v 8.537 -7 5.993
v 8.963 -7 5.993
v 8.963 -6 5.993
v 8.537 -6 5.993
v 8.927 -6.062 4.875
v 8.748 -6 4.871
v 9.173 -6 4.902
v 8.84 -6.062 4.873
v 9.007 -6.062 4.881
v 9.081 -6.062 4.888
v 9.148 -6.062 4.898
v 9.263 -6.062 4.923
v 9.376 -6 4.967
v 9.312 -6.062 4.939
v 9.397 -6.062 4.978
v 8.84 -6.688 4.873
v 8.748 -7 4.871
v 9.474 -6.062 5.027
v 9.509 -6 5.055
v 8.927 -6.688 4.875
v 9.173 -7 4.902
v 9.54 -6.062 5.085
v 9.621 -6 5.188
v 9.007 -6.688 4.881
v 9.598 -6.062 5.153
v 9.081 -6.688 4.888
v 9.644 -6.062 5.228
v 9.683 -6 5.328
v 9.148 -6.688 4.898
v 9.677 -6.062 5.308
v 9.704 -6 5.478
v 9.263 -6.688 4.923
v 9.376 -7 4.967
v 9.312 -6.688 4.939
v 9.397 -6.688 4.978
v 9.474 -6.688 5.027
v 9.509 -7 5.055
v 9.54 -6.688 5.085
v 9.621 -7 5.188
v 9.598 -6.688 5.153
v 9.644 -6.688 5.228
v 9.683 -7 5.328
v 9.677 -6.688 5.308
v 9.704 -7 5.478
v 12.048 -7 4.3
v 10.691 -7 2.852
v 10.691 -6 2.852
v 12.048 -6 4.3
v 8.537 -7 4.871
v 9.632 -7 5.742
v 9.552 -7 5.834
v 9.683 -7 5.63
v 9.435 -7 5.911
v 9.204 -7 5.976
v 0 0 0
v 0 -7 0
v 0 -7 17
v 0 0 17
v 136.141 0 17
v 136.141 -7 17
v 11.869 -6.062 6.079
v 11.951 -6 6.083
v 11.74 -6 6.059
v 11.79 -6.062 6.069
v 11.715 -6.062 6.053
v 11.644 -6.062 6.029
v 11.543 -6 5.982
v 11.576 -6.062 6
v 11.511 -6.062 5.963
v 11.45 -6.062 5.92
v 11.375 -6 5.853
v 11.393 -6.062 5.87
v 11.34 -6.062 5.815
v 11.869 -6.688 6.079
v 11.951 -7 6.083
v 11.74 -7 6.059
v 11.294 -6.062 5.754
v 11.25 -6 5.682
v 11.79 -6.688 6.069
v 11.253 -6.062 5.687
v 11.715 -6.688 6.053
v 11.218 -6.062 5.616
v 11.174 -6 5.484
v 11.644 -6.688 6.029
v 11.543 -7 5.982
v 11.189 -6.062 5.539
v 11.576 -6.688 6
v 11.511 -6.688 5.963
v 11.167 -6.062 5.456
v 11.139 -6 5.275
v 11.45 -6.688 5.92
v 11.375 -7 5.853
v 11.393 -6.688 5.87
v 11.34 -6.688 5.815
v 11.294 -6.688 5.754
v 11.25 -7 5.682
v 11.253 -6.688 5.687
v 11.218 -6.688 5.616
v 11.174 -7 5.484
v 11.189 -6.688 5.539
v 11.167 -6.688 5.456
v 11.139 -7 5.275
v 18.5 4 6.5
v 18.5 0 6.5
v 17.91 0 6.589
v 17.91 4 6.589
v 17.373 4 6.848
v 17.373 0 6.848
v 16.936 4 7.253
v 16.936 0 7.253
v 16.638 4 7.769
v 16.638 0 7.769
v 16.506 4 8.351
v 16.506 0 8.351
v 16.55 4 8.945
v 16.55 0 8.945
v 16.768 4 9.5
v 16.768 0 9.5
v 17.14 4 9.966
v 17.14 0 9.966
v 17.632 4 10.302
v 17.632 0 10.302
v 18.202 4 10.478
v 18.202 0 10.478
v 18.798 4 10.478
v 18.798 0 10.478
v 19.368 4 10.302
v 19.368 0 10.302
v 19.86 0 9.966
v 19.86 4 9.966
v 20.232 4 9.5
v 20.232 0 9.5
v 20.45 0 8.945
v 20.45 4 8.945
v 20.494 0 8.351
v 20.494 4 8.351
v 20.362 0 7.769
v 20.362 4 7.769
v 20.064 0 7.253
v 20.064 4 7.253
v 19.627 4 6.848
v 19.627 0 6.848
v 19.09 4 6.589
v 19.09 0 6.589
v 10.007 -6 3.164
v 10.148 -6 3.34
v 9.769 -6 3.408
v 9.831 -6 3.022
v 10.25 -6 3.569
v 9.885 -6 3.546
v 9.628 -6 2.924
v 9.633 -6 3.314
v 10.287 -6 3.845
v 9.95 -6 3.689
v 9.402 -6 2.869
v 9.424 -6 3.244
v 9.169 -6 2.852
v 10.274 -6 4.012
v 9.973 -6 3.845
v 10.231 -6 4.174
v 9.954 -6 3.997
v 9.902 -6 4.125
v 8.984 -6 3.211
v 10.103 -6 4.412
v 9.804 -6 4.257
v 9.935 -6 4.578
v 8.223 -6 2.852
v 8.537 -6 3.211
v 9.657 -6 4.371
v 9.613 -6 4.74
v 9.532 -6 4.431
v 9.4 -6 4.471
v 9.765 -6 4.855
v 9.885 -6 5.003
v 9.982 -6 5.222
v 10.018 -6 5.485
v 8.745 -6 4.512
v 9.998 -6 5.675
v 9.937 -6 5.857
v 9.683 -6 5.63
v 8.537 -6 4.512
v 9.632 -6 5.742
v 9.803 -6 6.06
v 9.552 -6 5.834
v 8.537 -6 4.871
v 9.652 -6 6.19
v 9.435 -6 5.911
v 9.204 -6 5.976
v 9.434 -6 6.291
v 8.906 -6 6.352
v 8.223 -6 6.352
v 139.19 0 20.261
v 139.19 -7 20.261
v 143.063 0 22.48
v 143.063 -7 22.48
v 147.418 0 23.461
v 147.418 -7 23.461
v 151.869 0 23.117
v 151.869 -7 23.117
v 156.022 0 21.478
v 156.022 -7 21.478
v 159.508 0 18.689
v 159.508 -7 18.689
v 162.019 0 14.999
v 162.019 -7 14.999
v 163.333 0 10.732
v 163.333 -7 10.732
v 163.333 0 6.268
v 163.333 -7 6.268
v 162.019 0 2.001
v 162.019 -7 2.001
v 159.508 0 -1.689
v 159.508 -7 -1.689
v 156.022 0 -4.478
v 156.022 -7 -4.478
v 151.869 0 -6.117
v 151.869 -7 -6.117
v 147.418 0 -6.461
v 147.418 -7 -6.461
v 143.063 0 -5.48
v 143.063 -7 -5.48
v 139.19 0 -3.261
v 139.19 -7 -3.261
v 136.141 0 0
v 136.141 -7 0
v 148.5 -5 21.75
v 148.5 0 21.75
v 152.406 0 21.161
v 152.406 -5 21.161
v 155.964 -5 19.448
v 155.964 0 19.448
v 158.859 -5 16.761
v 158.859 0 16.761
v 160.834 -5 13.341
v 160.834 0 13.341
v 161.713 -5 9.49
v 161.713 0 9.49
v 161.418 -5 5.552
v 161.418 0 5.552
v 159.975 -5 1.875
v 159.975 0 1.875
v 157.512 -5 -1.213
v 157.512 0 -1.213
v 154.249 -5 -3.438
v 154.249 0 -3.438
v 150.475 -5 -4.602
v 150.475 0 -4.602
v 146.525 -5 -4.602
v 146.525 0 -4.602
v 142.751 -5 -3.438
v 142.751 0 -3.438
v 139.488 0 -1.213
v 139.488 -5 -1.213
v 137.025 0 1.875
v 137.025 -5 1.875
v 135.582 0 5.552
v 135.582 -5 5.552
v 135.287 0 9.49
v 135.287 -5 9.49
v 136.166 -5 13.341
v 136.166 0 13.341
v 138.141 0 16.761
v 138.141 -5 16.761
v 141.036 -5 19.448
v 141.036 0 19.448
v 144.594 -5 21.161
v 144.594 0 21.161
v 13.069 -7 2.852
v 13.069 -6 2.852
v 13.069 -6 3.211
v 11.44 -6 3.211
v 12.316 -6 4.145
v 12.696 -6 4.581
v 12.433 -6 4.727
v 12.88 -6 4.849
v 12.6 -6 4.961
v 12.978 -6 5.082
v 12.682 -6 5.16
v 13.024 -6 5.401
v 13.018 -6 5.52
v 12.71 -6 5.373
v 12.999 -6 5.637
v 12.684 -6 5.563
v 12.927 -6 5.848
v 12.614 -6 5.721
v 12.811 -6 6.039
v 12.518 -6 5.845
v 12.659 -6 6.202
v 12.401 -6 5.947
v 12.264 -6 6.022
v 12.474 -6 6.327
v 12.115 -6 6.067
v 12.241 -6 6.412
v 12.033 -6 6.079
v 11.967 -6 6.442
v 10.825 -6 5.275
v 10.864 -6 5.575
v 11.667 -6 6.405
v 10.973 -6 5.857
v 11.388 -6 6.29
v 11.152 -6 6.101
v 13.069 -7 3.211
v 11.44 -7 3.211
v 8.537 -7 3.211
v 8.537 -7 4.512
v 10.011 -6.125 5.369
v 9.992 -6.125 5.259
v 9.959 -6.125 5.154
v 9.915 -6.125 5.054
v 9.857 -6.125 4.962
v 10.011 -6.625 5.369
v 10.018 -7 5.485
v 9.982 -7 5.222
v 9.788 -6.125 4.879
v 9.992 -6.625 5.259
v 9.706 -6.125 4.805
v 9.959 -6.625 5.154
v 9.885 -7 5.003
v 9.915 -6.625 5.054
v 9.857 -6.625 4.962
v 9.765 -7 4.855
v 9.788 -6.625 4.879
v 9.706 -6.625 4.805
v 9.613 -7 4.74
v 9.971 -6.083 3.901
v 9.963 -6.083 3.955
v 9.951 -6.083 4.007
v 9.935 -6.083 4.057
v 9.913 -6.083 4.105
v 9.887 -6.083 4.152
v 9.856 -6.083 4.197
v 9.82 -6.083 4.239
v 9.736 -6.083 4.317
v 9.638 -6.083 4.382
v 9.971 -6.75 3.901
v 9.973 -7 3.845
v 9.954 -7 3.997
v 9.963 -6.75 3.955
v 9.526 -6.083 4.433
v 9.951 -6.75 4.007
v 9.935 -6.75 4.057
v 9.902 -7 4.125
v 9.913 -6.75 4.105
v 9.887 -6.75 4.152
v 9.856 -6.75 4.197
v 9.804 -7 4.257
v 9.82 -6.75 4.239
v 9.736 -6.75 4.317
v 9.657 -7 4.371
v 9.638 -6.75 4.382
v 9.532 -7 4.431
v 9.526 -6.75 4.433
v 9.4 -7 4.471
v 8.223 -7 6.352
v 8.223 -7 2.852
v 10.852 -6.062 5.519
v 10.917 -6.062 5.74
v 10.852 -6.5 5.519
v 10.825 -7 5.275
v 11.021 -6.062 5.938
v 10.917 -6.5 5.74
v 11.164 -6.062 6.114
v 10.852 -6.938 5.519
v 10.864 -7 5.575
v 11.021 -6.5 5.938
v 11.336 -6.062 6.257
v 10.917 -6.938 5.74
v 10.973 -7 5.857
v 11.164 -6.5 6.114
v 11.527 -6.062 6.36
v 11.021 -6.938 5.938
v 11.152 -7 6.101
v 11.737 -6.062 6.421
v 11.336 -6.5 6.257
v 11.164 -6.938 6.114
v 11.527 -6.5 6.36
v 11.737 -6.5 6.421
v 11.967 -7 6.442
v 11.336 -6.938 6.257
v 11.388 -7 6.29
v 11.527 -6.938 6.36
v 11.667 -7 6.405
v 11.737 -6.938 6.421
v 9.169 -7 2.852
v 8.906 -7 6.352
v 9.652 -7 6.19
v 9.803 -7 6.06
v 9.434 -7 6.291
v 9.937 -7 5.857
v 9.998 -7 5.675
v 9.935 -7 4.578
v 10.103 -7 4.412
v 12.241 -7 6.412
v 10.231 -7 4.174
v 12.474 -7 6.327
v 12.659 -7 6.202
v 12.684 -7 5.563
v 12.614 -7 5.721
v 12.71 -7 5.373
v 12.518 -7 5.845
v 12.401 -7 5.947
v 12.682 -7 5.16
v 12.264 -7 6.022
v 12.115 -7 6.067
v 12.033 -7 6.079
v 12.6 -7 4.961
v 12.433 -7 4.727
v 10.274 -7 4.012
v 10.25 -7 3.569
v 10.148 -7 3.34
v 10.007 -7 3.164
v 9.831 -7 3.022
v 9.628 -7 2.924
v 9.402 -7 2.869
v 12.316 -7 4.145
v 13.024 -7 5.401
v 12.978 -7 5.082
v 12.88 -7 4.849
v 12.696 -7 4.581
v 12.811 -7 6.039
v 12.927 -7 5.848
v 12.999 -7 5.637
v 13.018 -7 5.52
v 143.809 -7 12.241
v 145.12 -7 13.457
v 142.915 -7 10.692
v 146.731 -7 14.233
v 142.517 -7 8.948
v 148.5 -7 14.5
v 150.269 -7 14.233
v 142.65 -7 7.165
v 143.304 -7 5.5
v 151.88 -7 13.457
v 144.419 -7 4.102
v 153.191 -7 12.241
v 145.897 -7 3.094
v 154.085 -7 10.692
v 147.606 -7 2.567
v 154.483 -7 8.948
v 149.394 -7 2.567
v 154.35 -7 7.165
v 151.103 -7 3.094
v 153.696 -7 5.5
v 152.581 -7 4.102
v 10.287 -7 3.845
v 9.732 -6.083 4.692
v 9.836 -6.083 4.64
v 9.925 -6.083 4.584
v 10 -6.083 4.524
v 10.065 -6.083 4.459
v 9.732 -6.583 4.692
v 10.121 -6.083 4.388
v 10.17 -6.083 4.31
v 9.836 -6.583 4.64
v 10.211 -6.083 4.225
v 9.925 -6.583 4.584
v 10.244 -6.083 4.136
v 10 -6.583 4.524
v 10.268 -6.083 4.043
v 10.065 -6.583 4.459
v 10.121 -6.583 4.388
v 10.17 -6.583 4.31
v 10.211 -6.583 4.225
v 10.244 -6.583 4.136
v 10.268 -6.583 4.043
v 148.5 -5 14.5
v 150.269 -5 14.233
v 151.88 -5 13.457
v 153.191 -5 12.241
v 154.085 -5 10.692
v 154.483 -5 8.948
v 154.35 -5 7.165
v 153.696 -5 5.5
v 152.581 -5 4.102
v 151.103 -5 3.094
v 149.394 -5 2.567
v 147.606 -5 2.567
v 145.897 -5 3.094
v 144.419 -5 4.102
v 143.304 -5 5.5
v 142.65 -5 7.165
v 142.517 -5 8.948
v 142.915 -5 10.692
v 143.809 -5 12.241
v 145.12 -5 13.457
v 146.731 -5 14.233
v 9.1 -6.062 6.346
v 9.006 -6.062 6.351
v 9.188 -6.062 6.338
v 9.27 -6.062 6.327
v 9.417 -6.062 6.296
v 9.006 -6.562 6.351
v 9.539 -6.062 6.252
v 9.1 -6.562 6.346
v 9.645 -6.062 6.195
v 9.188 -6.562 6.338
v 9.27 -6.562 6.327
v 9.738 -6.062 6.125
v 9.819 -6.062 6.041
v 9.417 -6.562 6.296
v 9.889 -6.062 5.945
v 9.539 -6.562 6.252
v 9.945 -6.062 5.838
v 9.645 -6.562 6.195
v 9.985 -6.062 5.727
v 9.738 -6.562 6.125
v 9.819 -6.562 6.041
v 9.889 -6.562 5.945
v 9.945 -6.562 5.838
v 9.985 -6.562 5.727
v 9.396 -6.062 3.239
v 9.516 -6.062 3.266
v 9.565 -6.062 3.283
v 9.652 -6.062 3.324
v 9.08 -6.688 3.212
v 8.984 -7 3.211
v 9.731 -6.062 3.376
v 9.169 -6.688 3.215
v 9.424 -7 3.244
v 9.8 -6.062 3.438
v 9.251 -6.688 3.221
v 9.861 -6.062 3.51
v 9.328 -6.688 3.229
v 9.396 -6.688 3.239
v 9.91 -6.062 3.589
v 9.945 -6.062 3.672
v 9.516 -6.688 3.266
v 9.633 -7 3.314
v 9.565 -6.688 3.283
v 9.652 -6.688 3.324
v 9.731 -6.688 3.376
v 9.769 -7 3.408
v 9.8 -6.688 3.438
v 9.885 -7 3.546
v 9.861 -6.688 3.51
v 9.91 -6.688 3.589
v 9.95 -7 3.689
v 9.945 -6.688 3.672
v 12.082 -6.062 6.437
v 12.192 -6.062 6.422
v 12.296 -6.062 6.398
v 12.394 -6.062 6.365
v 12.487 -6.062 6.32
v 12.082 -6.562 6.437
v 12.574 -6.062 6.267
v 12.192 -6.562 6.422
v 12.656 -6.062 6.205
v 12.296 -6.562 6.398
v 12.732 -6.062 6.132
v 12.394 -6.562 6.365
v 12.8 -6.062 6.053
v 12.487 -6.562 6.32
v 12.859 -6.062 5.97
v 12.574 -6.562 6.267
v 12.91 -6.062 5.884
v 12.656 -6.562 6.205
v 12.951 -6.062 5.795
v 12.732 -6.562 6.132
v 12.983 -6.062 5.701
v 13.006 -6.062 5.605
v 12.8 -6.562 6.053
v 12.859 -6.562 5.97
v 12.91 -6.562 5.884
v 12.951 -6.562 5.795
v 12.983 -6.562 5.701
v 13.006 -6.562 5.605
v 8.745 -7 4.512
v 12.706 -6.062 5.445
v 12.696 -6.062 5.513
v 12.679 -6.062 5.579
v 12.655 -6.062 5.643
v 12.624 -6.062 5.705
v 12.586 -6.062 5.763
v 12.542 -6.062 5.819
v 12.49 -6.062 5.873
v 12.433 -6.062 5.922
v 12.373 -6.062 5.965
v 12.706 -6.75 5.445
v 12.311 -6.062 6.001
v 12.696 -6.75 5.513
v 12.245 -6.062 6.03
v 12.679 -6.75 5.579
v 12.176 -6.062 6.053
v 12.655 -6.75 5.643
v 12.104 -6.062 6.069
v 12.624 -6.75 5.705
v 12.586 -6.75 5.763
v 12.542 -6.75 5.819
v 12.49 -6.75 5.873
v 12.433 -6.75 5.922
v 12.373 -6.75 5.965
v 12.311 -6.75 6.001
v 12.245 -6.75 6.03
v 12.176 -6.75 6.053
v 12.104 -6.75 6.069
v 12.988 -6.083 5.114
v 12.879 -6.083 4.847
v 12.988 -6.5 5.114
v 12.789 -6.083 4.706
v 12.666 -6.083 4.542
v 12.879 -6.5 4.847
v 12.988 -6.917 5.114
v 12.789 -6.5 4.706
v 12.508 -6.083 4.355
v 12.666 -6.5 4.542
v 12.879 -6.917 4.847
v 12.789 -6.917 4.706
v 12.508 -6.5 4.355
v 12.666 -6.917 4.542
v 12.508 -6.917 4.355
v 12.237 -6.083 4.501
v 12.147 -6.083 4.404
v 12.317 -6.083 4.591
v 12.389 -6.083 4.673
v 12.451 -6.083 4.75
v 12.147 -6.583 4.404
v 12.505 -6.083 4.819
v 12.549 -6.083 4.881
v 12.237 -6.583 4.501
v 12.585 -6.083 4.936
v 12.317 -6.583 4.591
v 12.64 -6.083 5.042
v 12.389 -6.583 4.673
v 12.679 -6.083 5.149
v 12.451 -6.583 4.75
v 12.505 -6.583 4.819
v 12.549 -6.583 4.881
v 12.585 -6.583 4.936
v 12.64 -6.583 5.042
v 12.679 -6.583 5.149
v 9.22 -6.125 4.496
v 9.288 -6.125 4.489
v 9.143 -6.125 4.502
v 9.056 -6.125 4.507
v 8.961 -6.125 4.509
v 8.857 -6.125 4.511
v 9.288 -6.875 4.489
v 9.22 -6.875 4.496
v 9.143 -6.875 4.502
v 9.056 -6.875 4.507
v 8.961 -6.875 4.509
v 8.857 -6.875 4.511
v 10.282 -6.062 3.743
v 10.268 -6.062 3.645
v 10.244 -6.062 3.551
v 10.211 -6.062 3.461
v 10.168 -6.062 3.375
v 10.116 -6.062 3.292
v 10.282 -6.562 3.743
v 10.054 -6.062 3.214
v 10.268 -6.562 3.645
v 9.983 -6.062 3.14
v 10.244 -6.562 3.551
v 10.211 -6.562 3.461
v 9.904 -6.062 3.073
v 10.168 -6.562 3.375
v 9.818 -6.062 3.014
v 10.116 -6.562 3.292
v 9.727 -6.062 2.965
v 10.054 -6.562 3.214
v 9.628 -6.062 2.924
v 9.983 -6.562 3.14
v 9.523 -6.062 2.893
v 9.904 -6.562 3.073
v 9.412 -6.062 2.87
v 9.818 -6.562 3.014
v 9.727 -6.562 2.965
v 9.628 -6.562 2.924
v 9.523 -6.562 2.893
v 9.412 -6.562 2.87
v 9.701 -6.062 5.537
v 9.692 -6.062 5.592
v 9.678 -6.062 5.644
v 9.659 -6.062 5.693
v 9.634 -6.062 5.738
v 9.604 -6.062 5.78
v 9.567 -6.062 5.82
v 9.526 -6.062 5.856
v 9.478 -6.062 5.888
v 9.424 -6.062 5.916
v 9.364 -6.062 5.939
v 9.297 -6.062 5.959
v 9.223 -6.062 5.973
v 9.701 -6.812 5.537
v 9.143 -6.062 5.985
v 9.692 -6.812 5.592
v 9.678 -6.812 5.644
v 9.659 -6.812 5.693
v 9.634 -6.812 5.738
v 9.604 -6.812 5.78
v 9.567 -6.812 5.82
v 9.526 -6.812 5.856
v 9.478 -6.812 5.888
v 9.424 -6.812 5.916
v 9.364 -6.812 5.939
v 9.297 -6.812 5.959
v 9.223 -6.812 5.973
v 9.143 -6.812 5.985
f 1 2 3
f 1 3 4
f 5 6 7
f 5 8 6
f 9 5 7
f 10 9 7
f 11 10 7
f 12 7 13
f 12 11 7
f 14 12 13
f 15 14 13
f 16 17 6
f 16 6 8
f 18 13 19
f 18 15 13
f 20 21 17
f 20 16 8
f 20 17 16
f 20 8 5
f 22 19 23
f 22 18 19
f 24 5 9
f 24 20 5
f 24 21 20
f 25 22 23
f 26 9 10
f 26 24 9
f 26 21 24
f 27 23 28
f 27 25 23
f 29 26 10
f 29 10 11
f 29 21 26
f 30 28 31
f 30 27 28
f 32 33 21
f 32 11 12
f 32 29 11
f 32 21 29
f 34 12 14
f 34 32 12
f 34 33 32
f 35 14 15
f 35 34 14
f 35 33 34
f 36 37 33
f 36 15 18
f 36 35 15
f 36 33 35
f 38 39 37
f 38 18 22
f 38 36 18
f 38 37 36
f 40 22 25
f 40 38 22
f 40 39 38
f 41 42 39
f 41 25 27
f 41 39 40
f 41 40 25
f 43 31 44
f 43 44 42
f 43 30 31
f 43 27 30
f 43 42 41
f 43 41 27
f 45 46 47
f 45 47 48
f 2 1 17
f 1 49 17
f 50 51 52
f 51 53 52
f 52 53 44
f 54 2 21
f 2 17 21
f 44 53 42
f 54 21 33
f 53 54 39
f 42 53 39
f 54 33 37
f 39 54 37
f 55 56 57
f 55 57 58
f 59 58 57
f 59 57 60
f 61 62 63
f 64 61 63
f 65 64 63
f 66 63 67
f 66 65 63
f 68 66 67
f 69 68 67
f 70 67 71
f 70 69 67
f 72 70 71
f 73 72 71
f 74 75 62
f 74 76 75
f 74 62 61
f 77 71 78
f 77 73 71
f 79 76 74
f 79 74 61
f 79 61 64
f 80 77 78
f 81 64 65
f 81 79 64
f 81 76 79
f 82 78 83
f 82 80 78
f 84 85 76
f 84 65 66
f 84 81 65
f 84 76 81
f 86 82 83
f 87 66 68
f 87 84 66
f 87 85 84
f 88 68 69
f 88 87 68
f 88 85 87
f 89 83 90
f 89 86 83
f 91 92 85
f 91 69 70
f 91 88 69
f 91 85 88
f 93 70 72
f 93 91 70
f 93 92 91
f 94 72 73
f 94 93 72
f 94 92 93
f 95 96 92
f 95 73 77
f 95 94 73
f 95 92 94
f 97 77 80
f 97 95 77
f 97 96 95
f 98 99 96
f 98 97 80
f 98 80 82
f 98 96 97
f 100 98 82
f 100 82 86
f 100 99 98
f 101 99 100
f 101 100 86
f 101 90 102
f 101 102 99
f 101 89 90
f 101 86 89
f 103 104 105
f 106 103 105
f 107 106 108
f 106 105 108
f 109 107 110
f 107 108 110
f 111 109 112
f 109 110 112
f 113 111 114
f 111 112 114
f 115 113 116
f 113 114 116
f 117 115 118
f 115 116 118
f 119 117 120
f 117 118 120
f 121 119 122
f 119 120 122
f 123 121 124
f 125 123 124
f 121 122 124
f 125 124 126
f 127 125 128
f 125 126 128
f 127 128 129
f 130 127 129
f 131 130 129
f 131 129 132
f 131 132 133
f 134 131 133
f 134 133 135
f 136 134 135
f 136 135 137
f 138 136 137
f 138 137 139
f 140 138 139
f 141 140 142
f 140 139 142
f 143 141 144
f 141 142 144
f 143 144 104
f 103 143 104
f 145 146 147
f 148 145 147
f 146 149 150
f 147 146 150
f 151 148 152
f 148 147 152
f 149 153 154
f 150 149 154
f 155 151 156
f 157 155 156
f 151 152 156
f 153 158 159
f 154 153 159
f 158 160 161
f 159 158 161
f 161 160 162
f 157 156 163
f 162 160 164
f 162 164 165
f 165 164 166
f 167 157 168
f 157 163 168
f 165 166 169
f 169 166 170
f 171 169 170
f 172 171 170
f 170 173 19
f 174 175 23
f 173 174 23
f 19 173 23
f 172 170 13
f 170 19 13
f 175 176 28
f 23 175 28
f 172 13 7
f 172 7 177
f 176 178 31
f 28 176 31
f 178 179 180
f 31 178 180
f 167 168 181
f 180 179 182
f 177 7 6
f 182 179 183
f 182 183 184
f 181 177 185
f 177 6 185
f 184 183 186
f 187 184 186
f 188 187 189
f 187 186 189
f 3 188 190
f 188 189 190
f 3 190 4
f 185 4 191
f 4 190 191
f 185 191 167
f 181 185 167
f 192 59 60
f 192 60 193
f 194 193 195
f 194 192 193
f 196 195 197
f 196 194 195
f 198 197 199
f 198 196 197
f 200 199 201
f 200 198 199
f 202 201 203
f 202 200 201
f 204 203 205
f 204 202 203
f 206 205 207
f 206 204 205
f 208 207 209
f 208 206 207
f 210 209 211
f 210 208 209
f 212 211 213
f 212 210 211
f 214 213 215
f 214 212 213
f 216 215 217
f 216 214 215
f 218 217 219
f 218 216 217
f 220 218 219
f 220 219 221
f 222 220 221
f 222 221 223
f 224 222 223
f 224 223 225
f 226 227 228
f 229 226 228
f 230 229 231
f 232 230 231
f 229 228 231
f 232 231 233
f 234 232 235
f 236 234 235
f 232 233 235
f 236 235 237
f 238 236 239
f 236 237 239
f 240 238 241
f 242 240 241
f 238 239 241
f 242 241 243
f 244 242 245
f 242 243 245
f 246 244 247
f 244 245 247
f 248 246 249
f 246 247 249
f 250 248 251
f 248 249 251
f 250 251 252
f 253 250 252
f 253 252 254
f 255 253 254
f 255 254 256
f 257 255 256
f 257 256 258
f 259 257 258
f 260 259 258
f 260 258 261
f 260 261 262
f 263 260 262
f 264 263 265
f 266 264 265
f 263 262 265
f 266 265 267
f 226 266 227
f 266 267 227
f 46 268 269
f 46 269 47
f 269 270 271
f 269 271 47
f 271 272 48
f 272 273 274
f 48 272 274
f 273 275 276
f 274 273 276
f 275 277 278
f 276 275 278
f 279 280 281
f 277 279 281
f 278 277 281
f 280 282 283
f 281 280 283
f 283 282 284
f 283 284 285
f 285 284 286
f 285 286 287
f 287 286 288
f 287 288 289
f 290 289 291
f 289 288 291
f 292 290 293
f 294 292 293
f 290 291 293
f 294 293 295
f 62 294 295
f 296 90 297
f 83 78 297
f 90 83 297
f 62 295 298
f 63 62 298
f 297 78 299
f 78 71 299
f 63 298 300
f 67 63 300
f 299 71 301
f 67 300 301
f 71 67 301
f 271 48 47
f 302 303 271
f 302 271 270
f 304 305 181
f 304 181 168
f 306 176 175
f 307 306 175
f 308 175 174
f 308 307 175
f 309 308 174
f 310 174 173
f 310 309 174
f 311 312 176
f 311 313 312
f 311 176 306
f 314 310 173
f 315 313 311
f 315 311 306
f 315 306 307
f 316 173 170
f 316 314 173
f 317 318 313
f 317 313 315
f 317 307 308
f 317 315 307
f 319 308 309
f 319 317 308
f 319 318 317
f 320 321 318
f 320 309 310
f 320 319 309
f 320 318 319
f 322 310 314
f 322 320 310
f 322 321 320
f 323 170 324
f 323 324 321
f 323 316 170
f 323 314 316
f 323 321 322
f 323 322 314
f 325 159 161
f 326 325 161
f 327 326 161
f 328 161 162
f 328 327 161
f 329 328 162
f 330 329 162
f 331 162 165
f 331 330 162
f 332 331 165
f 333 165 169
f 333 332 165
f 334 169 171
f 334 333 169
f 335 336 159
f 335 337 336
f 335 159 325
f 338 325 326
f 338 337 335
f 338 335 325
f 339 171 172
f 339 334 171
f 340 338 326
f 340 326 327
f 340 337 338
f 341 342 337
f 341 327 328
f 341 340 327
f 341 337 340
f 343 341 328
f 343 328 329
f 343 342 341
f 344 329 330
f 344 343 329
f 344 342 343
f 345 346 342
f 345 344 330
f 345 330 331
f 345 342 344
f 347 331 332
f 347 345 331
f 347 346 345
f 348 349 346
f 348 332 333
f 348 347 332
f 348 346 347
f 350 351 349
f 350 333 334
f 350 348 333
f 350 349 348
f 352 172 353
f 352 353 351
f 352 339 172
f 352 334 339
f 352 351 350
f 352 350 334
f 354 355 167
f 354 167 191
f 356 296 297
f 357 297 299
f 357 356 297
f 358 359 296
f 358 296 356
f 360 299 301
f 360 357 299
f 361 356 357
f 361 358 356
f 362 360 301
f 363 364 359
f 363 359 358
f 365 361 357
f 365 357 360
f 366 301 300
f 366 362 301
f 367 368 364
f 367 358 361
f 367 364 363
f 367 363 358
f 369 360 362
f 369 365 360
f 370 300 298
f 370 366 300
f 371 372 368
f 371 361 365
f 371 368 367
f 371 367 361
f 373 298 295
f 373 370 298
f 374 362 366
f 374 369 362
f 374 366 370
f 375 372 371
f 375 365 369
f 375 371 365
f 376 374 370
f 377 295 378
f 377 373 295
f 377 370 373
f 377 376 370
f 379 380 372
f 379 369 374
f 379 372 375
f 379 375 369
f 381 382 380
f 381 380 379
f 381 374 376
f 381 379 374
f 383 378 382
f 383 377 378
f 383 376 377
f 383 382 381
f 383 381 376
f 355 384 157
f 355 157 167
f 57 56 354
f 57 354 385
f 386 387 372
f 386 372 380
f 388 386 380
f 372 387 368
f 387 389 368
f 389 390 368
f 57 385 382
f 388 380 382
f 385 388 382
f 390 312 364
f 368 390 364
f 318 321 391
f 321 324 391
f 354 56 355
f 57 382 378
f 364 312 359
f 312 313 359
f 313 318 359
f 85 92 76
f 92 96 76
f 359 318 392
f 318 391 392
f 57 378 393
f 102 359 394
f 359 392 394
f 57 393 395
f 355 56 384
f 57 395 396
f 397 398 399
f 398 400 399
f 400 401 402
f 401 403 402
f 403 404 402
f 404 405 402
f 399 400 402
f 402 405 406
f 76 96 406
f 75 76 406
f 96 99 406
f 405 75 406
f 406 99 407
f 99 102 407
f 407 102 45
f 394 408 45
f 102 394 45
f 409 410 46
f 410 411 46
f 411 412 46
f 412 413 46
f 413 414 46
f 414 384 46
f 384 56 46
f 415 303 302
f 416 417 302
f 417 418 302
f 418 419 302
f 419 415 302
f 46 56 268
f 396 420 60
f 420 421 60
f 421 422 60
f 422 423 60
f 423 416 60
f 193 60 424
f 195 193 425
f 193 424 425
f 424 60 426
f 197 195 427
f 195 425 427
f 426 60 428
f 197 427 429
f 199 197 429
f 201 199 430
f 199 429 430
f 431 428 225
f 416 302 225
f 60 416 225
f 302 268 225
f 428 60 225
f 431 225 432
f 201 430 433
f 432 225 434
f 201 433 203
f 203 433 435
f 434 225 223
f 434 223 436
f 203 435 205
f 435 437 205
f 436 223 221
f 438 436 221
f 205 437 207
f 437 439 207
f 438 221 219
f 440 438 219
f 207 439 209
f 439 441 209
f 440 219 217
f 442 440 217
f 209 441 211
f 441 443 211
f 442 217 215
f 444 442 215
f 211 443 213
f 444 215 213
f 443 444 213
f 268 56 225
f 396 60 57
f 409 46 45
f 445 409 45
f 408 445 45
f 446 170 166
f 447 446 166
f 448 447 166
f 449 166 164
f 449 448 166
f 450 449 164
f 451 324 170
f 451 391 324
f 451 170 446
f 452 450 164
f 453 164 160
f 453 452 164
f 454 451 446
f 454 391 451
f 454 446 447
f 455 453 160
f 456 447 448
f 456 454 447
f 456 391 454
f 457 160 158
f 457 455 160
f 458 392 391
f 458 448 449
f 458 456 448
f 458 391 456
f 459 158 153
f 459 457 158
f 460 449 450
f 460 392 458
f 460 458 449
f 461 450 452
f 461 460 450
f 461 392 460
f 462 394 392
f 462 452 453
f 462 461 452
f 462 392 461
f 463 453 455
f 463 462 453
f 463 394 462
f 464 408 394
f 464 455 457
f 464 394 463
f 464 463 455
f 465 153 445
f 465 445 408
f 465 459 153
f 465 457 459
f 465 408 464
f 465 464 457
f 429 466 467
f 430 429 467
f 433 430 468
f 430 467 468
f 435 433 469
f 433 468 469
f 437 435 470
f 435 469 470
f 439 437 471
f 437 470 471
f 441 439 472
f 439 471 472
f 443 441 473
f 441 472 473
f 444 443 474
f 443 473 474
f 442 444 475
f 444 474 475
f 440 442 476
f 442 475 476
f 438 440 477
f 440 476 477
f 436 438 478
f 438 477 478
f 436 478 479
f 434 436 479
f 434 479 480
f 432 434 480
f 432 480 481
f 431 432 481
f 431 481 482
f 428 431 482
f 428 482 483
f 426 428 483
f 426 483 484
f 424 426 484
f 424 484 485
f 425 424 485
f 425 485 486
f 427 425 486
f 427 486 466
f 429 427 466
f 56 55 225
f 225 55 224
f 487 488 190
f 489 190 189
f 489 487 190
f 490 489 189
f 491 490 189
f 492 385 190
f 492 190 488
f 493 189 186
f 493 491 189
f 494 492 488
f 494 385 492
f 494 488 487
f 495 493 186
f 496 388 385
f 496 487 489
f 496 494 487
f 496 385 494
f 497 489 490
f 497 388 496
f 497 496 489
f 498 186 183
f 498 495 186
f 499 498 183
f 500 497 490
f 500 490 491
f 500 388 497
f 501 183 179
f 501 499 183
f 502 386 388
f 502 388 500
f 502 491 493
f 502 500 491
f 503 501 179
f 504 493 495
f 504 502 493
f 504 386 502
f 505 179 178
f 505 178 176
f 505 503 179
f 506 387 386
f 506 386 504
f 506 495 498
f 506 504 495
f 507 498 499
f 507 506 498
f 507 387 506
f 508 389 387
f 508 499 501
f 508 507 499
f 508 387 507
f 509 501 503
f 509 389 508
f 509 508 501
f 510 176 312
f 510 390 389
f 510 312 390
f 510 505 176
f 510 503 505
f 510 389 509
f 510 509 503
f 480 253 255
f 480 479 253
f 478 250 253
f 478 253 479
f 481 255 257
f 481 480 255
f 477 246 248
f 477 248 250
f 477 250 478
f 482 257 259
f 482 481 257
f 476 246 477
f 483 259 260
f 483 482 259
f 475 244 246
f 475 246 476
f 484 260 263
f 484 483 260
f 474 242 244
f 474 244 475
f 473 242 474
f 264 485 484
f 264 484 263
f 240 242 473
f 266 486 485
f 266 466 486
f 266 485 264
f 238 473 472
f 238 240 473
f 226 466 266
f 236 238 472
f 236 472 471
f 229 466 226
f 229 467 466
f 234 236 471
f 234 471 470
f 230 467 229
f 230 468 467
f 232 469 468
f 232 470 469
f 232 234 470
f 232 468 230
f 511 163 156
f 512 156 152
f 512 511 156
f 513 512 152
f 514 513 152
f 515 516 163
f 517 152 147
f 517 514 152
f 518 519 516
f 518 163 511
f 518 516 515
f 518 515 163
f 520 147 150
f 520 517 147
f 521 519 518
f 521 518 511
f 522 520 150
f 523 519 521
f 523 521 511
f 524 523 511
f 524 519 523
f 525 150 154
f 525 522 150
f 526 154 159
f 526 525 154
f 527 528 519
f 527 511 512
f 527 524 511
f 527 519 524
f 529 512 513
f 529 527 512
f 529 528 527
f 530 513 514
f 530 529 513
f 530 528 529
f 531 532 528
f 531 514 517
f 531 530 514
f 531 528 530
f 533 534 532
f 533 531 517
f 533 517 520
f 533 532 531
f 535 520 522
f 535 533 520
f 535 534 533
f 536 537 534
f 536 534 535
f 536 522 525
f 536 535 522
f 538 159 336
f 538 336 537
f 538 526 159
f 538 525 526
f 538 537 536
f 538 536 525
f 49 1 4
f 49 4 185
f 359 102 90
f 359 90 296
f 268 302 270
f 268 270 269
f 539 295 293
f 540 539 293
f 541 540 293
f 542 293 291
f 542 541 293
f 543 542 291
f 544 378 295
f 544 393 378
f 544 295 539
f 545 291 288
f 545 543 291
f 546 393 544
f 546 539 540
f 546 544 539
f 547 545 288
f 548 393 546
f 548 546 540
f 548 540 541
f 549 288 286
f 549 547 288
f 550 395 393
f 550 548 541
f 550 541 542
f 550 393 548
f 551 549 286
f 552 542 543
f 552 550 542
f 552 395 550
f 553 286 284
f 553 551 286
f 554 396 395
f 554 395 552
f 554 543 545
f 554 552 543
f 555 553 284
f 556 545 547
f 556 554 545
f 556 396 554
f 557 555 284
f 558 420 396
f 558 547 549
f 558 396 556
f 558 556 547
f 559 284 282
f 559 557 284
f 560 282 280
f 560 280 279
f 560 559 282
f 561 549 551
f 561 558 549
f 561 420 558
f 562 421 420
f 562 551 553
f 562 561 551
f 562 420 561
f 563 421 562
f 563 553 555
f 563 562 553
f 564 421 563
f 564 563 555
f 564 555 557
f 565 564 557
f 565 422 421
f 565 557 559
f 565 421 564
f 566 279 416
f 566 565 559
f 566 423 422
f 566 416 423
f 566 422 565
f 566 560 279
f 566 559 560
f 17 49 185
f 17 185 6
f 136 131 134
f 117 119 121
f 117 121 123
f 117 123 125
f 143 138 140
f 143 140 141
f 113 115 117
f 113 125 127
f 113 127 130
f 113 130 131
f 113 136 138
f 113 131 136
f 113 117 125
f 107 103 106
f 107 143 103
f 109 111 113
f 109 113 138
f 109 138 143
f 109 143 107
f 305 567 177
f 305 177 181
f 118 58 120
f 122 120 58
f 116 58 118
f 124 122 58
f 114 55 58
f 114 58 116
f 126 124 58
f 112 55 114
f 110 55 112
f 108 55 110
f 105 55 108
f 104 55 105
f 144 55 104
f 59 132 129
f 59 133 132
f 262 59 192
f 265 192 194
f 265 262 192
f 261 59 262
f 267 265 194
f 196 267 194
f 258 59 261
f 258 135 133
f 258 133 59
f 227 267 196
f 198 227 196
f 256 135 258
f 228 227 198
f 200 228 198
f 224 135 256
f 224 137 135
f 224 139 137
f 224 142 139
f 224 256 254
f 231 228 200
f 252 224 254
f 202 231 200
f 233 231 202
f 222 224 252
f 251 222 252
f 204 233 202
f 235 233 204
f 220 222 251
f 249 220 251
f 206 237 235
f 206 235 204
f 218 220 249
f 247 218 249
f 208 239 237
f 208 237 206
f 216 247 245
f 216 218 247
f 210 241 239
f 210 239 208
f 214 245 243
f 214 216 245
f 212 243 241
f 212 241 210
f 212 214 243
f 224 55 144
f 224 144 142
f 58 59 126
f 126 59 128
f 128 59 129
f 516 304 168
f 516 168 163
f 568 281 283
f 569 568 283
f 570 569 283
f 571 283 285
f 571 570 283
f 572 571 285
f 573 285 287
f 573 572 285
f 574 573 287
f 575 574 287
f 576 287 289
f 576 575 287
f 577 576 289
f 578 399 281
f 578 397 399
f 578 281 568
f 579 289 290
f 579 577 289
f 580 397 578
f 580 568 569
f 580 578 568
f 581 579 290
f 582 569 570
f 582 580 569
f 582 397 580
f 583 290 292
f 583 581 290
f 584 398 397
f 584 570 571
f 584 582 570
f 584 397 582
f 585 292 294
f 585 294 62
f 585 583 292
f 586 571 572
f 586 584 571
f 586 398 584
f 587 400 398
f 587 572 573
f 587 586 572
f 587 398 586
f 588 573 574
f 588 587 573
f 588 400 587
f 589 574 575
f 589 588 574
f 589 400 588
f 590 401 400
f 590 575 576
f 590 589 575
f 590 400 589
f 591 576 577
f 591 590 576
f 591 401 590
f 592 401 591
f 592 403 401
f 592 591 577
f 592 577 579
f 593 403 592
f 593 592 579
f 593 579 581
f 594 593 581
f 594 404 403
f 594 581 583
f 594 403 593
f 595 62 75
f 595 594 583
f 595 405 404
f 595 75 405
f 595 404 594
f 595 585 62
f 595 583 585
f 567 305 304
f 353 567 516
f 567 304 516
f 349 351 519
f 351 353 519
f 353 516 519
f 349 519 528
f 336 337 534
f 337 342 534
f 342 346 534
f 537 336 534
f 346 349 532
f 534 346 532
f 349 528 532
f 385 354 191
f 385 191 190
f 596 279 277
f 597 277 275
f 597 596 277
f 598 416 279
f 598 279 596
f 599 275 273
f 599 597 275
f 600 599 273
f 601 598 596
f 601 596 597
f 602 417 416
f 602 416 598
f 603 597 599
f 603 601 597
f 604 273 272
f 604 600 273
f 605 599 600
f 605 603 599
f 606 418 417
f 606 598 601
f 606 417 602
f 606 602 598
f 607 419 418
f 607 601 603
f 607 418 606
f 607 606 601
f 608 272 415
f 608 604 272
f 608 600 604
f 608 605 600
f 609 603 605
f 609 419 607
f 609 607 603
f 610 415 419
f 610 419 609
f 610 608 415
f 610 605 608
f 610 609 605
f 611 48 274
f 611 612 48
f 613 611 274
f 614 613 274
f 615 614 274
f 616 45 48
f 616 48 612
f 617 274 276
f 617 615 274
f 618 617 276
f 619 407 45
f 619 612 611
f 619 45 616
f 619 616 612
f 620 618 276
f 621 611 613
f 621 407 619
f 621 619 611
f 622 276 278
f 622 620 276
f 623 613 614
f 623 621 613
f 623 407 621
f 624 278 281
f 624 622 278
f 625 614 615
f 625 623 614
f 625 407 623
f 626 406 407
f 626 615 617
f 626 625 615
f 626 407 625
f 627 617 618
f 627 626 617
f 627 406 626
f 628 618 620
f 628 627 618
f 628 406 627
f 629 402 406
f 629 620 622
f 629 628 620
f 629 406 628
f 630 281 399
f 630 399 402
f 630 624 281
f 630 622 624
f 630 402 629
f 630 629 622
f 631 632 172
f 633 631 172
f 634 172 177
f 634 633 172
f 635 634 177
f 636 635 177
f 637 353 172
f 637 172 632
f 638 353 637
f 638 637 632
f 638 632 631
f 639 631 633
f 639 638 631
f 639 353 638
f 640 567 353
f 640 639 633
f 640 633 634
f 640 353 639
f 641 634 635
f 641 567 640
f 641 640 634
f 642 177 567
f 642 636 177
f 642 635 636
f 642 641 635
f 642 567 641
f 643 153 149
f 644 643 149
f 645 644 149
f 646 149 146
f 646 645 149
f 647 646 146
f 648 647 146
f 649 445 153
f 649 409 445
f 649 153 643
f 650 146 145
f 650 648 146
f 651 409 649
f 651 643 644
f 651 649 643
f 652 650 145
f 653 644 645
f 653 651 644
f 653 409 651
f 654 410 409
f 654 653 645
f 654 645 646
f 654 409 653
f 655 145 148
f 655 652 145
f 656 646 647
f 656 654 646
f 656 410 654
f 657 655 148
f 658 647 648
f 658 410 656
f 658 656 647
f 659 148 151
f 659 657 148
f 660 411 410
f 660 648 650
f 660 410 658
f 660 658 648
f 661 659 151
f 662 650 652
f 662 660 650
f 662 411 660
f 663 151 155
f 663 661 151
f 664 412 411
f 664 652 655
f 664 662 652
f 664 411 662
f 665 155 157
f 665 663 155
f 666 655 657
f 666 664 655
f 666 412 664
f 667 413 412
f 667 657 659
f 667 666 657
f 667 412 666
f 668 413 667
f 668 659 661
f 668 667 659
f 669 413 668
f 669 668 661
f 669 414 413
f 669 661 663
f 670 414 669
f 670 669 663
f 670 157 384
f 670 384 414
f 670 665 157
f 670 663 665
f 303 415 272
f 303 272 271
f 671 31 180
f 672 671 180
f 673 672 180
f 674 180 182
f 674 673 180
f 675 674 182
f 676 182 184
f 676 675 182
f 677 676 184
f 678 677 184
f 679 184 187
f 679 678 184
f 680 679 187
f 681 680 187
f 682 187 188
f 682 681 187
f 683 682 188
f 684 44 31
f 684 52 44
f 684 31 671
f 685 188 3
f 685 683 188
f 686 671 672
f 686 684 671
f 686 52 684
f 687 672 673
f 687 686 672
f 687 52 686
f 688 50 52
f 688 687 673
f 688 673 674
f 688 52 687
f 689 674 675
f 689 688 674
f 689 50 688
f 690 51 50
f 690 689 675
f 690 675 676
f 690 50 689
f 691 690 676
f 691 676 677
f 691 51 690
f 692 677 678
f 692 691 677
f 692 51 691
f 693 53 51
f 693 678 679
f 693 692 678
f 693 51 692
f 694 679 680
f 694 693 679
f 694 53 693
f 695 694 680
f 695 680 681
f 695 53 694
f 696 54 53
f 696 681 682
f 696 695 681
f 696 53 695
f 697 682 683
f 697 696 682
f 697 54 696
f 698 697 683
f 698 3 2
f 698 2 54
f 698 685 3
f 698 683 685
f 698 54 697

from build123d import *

# Parameters (mm, degrees)
SKETCH_3_W          = 148.5
SKETCH_3_H          = 7
EXTRUDE_1_DEPTH     = 17
SKETCH_4_R          = 15
CUT_EXTRUDE_3_DEPTH = 150.633719462
SKETCH_6_R          = 15
EXTRUDE_2_DEPTH     = 7
SKETCH_7_R          = 13.25
CUT_EXTRUDE_4_DEPTH = 5
SKETCH_8_R          = 6
CUT_EXTRUDE_5_DEPTH = 166.255862226
SKETCH_9_R          = 2
EXTRUDE_3_DEPTH     = 4
CUT_EXTRUDE_7_DEPTH = 1


with BuildPart() as part:
    # ｽｹｯﾁ3 → ﾎﾞｽ - 押し出し1 (new body)
    with BuildSketch(Plane.XY):
        with Locations((74.25, -3.5)):
            Rectangle(SKETCH_3_W, SKETCH_3_H)
    extrude(amount=EXTRUDE_1_DEPTH)

    # ｽｹｯﾁ4 → ｶｯﾄ - 押し出し3 (cut, through all)
    with BuildSketch(Plane(origin=(0, 0, 0), x_dir=(1, 0, 0), z_dir=(0, 1, 0))):
        with Locations((148.5, -8.5)):
            Circle(SKETCH_4_R)
    extrude(amount=-CUT_EXTRUDE_3_DEPTH, mode=Mode.SUBTRACT)

    # ｽｹｯﾁ6 → ﾎﾞｽ - 押し出し2 (add)
    with BuildSketch(Plane(origin=(0, 0, 0), x_dir=(1, 0, 0), z_dir=(0, 1, 0))):
        with Locations((148.5, -8.5)):
            Circle(SKETCH_6_R)
    extrude(amount=-EXTRUDE_2_DEPTH)

    # ｽｹｯﾁ7 → ｶｯﾄ - 押し出し4 (cut)
    with BuildSketch(Plane(origin=(0, 0, 0), x_dir=(1, 0, 0), z_dir=(0, 1, 0))):
        with Locations(Location((148.5, -8.5, 0), (0, 0, 270))):
            Circle(SKETCH_7_R)
    extrude(amount=-CUT_EXTRUDE_4_DEPTH, mode=Mode.SUBTRACT)

    # ｽｹｯﾁ8 → ｶｯﾄ - 押し出し5 (cut, through all)
    with BuildSketch(Plane(origin=(0, -5, 0), x_dir=(1, 0, 0), z_dir=(0, 1, 0))):
        with Locations(Location((148.5, -8.5, 0), (0, 0, 270))):
            Circle(SKETCH_8_R)
    extrude(amount=-CUT_EXTRUDE_5_DEPTH, mode=Mode.SUBTRACT)

    # ｽｹｯﾁ9 → ﾎﾞｽ - 押し出し3 (add)
    with BuildSketch(Plane(origin=(0, 0, 0), x_dir=(1, 0, 0), z_dir=(0, 1, 0))):
        with Locations(Location((18.5, -8.5, 0), (0, 0, 90))):
            Circle(SKETCH_9_R)
    extrude(amount=EXTRUDE_3_DEPTH)

    # ｽｹｯﾁ12 → ｶｯﾄ - 押し出し7 (cut)
    # profile 1 of 2: a face of its own
    with BuildSketch(Plane.XZ.offset(7)):
        with BuildLine():
            Line((8.222746092, 6.351907356), (8.90563872, 6.351907356))
            add(Edge.make_bspline(
                [(8.90563872, 6.351907356), (8.939067198, 6.351731606), (9.003859909, 6.351390958), (9.098079351, 6.346107827), (9.186328161, 6.338904157), (9.268631934, 6.327474064), (9.344952636, 6.313682287), (9.415520273, 6.296980471), (9.480110445, 6.276953857), (9.557223182, 6.245107576), (9.645143843, 6.197784408), (9.740342235, 6.127855843), (9.821746475, 6.042323379), (9.891932792, 5.945840724), (9.947733912, 5.839704952), (9.988103209, 5.726445764), (10.013661084, 5.607524022), (10.016289519, 5.525880844), (10.017617887, 5.484619696)],
                knots=[0, 0, 0, 0, 1.001505555, 1.941167018, 2.826882275, 3.653841531, 4.429895133, 5.150066043, 5.825578002, 6.45369114, 7.647487171, 8.808567382, 9.977351308, 11.170798116, 12.373658725, 13.556498008, 14.765093433, 16, 16, 16, 16], degree=3))
            add(Edge.make_bspline(
                [(10.017617887, 5.484619696), (10.016524668, 5.44596714), (10.014376391, 5.370011223), (9.993833632, 5.258917114), (9.961672963, 5.153165895), (9.916967714, 5.05314351), (9.858865718, 4.961109897), (9.790007399, 4.876322631), (9.706930597, 4.802371574), (9.644687357, 4.761028671), (9.613070611, 4.74002835)],
                knots=[0, 0, 0, 0, 1.044552857, 2.05264487, 3.044412934, 4.028983338, 5.005914585, 5.980388656, 6.974128949, 8, 8, 8, 8], degree=3))
            add(Edge.make_bspline(
                [(9.613070611, 4.74002835), (9.652831039, 4.724763351), (9.728902586, 4.695557627), (9.833588599, 4.643922163), (9.923783444, 4.587760052), (10.00018059, 4.526428202), (10.065518245, 4.460319391), (10.122571186, 4.388464277), (10.17125256, 4.309925519), (10.212965484, 4.225521984), (10.24551424, 4.136115515), (10.269890144, 4.042544739), (10.283857593, 3.945145184), (10.285845235, 3.878859805), (10.286848656, 3.84539694)],
                knots=[0, 0, 0, 0, 1.27268992, 2.434971085, 3.483601985, 4.442670788, 5.356604649, 6.2567628, 7.179492994, 8.113709626, 9.066344395, 10.018646069, 10.999752585, 12, 12, 12, 12], degree=3))
            add(Edge.make_bspline(
                [(10.286848656, 3.84539694), (10.28587181, 3.811230068), (10.283949838, 3.744005789), (10.269769866, 3.645250655), (10.245760759, 3.550875708), (10.212689613, 3.460270526), (10.169527298, 3.373610391), (10.116999334, 3.290797127), (10.05436777, 3.212662796), (9.984304901, 3.138339173), (9.905042756, 3.071511386), (9.819527001, 3.011995679), (9.726680681, 2.963049617), (9.628028687, 2.921933596), (9.522464371, 2.890526397), (9.410461764, 2.868553823), (9.292117462, 2.853748786), (9.210907711, 2.852531581), (9.169260515, 2.851907356)],
                knots=[0, 0, 0, 0, 0.978564426, 1.925352924, 2.850884081, 3.763762016, 4.682927383, 5.618979971, 6.567305752, 7.547517671, 8.540179244, 9.531824382, 10.526200242, 11.540722885, 12.589160233, 13.674978461, 14.80764778, 16, 16, 16, 16], degree=3))
            Line((9.169260515, 2.851907356), (8.222746092, 2.851907356))
            Line((8.222746092, 2.851907356), (8.222746092, 6.351907356))
        make_face()
        with BuildLine():
            Line((8.536848656, 5.992932997), (8.536848656, 4.871138126))
            Line((8.536848656, 4.871138126), (8.747886316, 4.871138126))
            add(Edge.make_bspline(
                [(8.747886316, 4.871138126), (8.778735112, 4.871538049), (8.838341271, 4.872310781), (8.924661168, 4.874524298), (9.004786186, 4.880722342), (9.078578019, 4.886918604), (9.145920463, 4.896993191), (9.206664324, 4.908985314), (9.261762921, 4.92166822), (9.325302467, 4.943237706), (9.397375415, 4.975115382), (9.474208519, 5.024587218), (9.541942989, 5.083511571), (9.599140177, 5.151502533), (9.645951647, 5.226368719), (9.678465362, 5.306915599), (9.700512647, 5.391135731), (9.702504178, 5.448953984), (9.703515323, 5.4783096)],
                knots=[0, 0, 0, 0, 1.156816544, 2.235205308, 3.236616184, 4.169592532, 5.011045266, 5.787822928, 6.49130361, 7.128639758, 8.301311294, 9.436451833, 10.541879658, 11.654887649, 12.756523258, 13.837046038, 14.901820046, 16, 16, 16, 16], degree=3))
            add(Edge.make_bspline(
                [(9.703515323, 5.4783096), (9.702989143, 5.497735371), (9.701956983, 5.535841144), (9.69350368, 5.591390498), (9.679136106, 5.64363425), (9.660681812, 5.693288361), (9.634893124, 5.738800211), (9.60452966, 5.781743406), (9.56784397, 5.820655525), (9.526086657, 5.857025023), (9.478078035, 5.889269551), (9.423846743, 5.917510314), (9.362659066, 5.940251091), (9.295546211, 5.960167243), (9.221475123, 5.974155537), (9.14130057, 5.985808925), (9.054365851, 5.991741667), (8.994220748, 5.99252703), (8.963130707, 5.992932997)],
                knots=[0, 0, 0, 0, 0.91205012, 1.789085906, 2.630437955, 3.453916878, 4.269457761, 5.079663411, 5.91843418, 6.774407191, 7.675494373, 8.627863946, 9.638891023, 10.736472738, 11.911756761, 13.175263542, 14.539845004, 16, 16, 16, 16], degree=3))
            Line((8.963130707, 5.992932997), (8.536848656, 5.992932997))
        make_face(mode=Mode.SUBTRACT)
        with BuildLine():
            Line((8.536848656, 4.512163767), (8.536848656, 3.210881715))
            Line((8.536848656, 3.210881715), (8.984164361, 3.210881715))
            add(Edge.make_bspline(
                [(8.984164361, 3.210881715), (9.016183287, 3.211265463), (9.077895546, 3.212005085), (9.166996776, 3.21441964), (9.24957988, 3.219911915), (9.325268015, 3.228557765), (9.394878468, 3.237936214), (9.457576171, 3.250547495), (9.513869364, 3.264996456), (9.579143672, 3.287330628), (9.652647181, 3.322027099), (9.731858037, 3.374341325), (9.802284255, 3.436664633), (9.862089514, 3.508795547), (9.911102503, 3.587226874), (9.946757958, 3.670372224), (9.968748815, 3.756857752), (9.971410984, 3.815824464), (9.972746092, 3.84539694)],
                knots=[0, 0, 0, 0, 1.160039823, 2.235823828, 3.228722157, 4.157150951, 4.99529583, 5.772374946, 6.472645482, 7.099169577, 8.269452708, 9.405989375, 10.527446681, 11.663510218, 12.788923519, 13.866172445, 14.929861265, 16, 16, 16, 16], degree=3))
            add(Edge.make_bspline(
                [(9.972746092, 3.84539694), (9.972469988, 3.86389028), (9.971922233, 3.900578662), (9.963661618, 3.954494481), (9.951647748, 4.006720354), (9.936116314, 4.057398095), (9.913496847, 4.105611471), (9.887090302, 4.152314031), (9.8561289, 4.19756751), (9.807884734, 4.254779764), (9.73771275, 4.320696777), (9.638005974, 4.385234279), (9.524633676, 4.437282086), (9.442406184, 4.459381562), (9.399929586, 4.470797581)],
                knots=[0, 0, 0, 0, 0.723448775, 1.435228256, 2.130040452, 2.821711965, 3.505591119, 4.210454504, 4.921174351, 5.648778258, 7.137944449, 8.670945889, 10.280296675, 12, 12, 12, 12], degree=3))
            add(Edge.make_bspline(
                [(9.399929586, 4.470797581), (9.38290049, 4.474252665), (9.345977897, 4.481743999), (9.285770317, 4.489651703), (9.217034448, 4.496696763), (9.139611571, 4.50190792), (9.05340373, 4.507294464), (8.958226811, 4.509389285), (8.854469496, 4.511888545), (8.782477124, 4.512069679), (8.745081829, 4.512163767)],
                knots=[0, 0, 0, 0, 0.634451884, 1.375622551, 2.216452059, 3.157844607, 4.20941857, 5.370758133, 6.634282058, 8, 8, 8, 8], degree=3))
            Line((8.745081829, 4.512163767), (8.536848656, 4.512163767))
        make_face(mode=Mode.SUBTRACT)
    # profile 2 of 2: a face of its own
    with BuildSketch(Plane.XZ.offset(7)):
        with BuildLine():
            Line((11.139412759, 5.274984279), (10.825310195, 5.274984279))
            add(Edge.make_bspline(
                [(10.825310195, 5.274984279), (10.827357348, 5.316655167), (10.831377902, 5.398495682), (10.850206191, 5.517819588), (10.877147068, 5.631874387), (10.915238522, 5.739744301), (10.9625448, 5.842383108), (11.019274827, 5.939383124), (11.086468678, 6.030374312), (11.162675412, 6.114513156), (11.245444051, 6.191700727), (11.33474999, 6.258355969), (11.428595018, 6.314673641), (11.526694417, 6.361754883), (11.63015498, 6.397094728), (11.738037838, 6.423316368), (11.850816974, 6.439092714), (11.927656996, 6.440788499), (11.966736477, 6.441650946)],
                knots=[0, 0, 0, 0, 1.10065271, 2.161652631, 3.183658789, 4.190468796, 5.17591951, 6.163126047, 7.15150782, 8.156236427, 9.156009102, 10.134482811, 11.092018607, 12.041330605, 13.001268258, 13.972401359, 14.968799086, 16, 16, 16, 16], degree=3))
            add(Edge.make_bspline(
                [(11.966736477, 6.441650946), (12.005114551, 6.44075249), (12.080526095, 6.438987055), (12.19058811, 6.423826026), (12.295365404, 6.400080434), (12.394653171, 6.366765018), (12.487659235, 6.32198059), (12.57508228, 6.268183052), (12.657963091, 6.20596322), (12.732569874, 6.132709407), (12.801077954, 6.054507022), (12.860180209, 5.971019119), (12.910793372, 5.884789833), (12.952981052, 5.795161631), (12.984037191, 5.701290603), (13.007615399, 5.6045434), (13.020942813, 5.503918589), (13.022988236, 5.435812033), (13.024028143, 5.401186202)],
                knots=[0, 0, 0, 0, 1.111607364, 2.184268762, 3.212621178, 4.221274766, 5.211760367, 6.196651075, 7.1921475, 8.207485113, 9.220403448, 10.201281604, 11.166441695, 12.114753415, 13.065576456, 14.026450734, 14.996634279, 16, 16, 16, 16], degree=3))
            add(Edge.make_bspline(
                [(13.024028143, 5.401186202), (13.02233488, 5.352438368), (13.018978069, 5.255798154), (12.990263693, 5.113783291), (12.945417181, 4.976189872), (12.891419825, 4.86545257), (12.83694738, 4.776219077), (12.787859873, 4.702750372), (12.730395062, 4.623644903), (12.663716564, 4.539167566), (12.589203692, 4.448656661), (12.506181528, 4.352166865), (12.414058046, 4.250695096), (12.349399546, 4.181389494), (12.31589513, 4.145477068)],
                knots=[0, 0, 0, 0, 1.184426356, 2.348067706, 3.509069118, 4.696110526, 5.333549288, 6.050745305, 6.844228056, 7.710549037, 8.667450064, 9.695053472, 10.805634456, 12, 12, 12, 12], degree=3))
            Line((12.31589513, 4.145477068), (11.440194009, 3.210881715))
            Line((11.440194009, 3.210881715), (13.068899938, 3.210881715))
            Line((13.068899938, 3.210881715), (13.068899938, 2.851907356))
            Line((13.068899938, 2.851907356), (10.69069481, 2.851907356))
            Line((10.69069481, 2.851907356), (12.048066605, 4.300424985))
            add(Edge.make_bspline(
                [(12.048066605, 4.300424985), (12.081114492, 4.334923291), (12.144592719, 4.401187478), (12.234375296, 4.497930438), (12.315014284, 4.587679979), (12.387031677, 4.670266527), (12.448865182, 4.746898095), (12.503737414, 4.815092798), (12.547703005, 4.877847249), (12.595418401, 4.950587863), (12.641632382, 5.03940018), (12.681344738, 5.147933869), (12.705559587, 5.259661122), (12.708464422, 5.335163159), (12.709925579, 5.373141331)],
                knots=[0, 0, 0, 0, 1.329631726, 2.553950428, 3.673215718, 4.687767853, 5.603093632, 6.413772471, 7.123043292, 7.734684054, 8.834405432, 9.900288307, 10.943827018, 12, 12, 12, 12], degree=3))
            add(Edge.make_bspline(
                [(12.709925579, 5.373141331), (12.709289837, 5.397022729), (12.708036911, 5.444088379), (12.696979213, 5.513094138), (12.680268707, 5.579658952), (12.656323449, 5.643987571), (12.624716709, 5.705433223), (12.586243329, 5.764070704), (12.541853266, 5.820759669), (12.490501996, 5.873912967), (12.434090477, 5.922594172), (12.374496227, 5.965718258), (12.311446123, 6.001757369), (12.245206001, 6.031300866), (12.175960531, 6.054476247), (12.103575786, 6.070534826), (12.02825177, 6.08061731), (11.976818274, 6.081981482), (11.950610675, 6.082676587)],
                knots=[0, 0, 0, 0, 0.991446411, 1.95395049, 2.89581595, 3.838931463, 4.798493298, 5.75982156, 6.748411868, 7.785213223, 8.824556874, 9.840280684, 10.836137867, 11.835679398, 12.848801643, 13.863922112, 14.911575587, 16, 16, 16, 16], degree=3))
            add(Edge.make_bspline(
                [(11.950610675, 6.082676587), (11.923239843, 6.081961555), (11.869488046, 6.08055735), (11.790569013, 6.070734686), (11.715283236, 6.053788845), (11.643441333, 6.030612171), (11.574921747, 6.001153622), (11.510057703, 5.964461877), (11.448994814, 5.920678384), (11.39161829, 5.871037828), (11.338754311, 5.815770227), (11.292307436, 5.754160263), (11.251723421, 5.687332848), (11.216314188, 5.615468298), (11.187558498, 5.537914518), (11.165585347, 5.454946813), (11.148198501, 5.366925431), (11.14238998, 5.306140346), (11.139412759, 5.274984279)],
                knots=[0, 0, 0, 0, 1.031018746, 2.02475058, 2.990194455, 3.934040569, 4.864654155, 5.795059489, 6.735614925, 7.690564532, 8.649604399, 9.611025574, 10.590972636, 11.591080095, 12.624614302, 13.701020113, 14.821632451, 16, 16, 16, 16], degree=3))
        make_face()
    extrude(amount=-CUT_EXTRUDE_7_DEPTH, mode=Mode.SUBTRACT)


solid = part.part
